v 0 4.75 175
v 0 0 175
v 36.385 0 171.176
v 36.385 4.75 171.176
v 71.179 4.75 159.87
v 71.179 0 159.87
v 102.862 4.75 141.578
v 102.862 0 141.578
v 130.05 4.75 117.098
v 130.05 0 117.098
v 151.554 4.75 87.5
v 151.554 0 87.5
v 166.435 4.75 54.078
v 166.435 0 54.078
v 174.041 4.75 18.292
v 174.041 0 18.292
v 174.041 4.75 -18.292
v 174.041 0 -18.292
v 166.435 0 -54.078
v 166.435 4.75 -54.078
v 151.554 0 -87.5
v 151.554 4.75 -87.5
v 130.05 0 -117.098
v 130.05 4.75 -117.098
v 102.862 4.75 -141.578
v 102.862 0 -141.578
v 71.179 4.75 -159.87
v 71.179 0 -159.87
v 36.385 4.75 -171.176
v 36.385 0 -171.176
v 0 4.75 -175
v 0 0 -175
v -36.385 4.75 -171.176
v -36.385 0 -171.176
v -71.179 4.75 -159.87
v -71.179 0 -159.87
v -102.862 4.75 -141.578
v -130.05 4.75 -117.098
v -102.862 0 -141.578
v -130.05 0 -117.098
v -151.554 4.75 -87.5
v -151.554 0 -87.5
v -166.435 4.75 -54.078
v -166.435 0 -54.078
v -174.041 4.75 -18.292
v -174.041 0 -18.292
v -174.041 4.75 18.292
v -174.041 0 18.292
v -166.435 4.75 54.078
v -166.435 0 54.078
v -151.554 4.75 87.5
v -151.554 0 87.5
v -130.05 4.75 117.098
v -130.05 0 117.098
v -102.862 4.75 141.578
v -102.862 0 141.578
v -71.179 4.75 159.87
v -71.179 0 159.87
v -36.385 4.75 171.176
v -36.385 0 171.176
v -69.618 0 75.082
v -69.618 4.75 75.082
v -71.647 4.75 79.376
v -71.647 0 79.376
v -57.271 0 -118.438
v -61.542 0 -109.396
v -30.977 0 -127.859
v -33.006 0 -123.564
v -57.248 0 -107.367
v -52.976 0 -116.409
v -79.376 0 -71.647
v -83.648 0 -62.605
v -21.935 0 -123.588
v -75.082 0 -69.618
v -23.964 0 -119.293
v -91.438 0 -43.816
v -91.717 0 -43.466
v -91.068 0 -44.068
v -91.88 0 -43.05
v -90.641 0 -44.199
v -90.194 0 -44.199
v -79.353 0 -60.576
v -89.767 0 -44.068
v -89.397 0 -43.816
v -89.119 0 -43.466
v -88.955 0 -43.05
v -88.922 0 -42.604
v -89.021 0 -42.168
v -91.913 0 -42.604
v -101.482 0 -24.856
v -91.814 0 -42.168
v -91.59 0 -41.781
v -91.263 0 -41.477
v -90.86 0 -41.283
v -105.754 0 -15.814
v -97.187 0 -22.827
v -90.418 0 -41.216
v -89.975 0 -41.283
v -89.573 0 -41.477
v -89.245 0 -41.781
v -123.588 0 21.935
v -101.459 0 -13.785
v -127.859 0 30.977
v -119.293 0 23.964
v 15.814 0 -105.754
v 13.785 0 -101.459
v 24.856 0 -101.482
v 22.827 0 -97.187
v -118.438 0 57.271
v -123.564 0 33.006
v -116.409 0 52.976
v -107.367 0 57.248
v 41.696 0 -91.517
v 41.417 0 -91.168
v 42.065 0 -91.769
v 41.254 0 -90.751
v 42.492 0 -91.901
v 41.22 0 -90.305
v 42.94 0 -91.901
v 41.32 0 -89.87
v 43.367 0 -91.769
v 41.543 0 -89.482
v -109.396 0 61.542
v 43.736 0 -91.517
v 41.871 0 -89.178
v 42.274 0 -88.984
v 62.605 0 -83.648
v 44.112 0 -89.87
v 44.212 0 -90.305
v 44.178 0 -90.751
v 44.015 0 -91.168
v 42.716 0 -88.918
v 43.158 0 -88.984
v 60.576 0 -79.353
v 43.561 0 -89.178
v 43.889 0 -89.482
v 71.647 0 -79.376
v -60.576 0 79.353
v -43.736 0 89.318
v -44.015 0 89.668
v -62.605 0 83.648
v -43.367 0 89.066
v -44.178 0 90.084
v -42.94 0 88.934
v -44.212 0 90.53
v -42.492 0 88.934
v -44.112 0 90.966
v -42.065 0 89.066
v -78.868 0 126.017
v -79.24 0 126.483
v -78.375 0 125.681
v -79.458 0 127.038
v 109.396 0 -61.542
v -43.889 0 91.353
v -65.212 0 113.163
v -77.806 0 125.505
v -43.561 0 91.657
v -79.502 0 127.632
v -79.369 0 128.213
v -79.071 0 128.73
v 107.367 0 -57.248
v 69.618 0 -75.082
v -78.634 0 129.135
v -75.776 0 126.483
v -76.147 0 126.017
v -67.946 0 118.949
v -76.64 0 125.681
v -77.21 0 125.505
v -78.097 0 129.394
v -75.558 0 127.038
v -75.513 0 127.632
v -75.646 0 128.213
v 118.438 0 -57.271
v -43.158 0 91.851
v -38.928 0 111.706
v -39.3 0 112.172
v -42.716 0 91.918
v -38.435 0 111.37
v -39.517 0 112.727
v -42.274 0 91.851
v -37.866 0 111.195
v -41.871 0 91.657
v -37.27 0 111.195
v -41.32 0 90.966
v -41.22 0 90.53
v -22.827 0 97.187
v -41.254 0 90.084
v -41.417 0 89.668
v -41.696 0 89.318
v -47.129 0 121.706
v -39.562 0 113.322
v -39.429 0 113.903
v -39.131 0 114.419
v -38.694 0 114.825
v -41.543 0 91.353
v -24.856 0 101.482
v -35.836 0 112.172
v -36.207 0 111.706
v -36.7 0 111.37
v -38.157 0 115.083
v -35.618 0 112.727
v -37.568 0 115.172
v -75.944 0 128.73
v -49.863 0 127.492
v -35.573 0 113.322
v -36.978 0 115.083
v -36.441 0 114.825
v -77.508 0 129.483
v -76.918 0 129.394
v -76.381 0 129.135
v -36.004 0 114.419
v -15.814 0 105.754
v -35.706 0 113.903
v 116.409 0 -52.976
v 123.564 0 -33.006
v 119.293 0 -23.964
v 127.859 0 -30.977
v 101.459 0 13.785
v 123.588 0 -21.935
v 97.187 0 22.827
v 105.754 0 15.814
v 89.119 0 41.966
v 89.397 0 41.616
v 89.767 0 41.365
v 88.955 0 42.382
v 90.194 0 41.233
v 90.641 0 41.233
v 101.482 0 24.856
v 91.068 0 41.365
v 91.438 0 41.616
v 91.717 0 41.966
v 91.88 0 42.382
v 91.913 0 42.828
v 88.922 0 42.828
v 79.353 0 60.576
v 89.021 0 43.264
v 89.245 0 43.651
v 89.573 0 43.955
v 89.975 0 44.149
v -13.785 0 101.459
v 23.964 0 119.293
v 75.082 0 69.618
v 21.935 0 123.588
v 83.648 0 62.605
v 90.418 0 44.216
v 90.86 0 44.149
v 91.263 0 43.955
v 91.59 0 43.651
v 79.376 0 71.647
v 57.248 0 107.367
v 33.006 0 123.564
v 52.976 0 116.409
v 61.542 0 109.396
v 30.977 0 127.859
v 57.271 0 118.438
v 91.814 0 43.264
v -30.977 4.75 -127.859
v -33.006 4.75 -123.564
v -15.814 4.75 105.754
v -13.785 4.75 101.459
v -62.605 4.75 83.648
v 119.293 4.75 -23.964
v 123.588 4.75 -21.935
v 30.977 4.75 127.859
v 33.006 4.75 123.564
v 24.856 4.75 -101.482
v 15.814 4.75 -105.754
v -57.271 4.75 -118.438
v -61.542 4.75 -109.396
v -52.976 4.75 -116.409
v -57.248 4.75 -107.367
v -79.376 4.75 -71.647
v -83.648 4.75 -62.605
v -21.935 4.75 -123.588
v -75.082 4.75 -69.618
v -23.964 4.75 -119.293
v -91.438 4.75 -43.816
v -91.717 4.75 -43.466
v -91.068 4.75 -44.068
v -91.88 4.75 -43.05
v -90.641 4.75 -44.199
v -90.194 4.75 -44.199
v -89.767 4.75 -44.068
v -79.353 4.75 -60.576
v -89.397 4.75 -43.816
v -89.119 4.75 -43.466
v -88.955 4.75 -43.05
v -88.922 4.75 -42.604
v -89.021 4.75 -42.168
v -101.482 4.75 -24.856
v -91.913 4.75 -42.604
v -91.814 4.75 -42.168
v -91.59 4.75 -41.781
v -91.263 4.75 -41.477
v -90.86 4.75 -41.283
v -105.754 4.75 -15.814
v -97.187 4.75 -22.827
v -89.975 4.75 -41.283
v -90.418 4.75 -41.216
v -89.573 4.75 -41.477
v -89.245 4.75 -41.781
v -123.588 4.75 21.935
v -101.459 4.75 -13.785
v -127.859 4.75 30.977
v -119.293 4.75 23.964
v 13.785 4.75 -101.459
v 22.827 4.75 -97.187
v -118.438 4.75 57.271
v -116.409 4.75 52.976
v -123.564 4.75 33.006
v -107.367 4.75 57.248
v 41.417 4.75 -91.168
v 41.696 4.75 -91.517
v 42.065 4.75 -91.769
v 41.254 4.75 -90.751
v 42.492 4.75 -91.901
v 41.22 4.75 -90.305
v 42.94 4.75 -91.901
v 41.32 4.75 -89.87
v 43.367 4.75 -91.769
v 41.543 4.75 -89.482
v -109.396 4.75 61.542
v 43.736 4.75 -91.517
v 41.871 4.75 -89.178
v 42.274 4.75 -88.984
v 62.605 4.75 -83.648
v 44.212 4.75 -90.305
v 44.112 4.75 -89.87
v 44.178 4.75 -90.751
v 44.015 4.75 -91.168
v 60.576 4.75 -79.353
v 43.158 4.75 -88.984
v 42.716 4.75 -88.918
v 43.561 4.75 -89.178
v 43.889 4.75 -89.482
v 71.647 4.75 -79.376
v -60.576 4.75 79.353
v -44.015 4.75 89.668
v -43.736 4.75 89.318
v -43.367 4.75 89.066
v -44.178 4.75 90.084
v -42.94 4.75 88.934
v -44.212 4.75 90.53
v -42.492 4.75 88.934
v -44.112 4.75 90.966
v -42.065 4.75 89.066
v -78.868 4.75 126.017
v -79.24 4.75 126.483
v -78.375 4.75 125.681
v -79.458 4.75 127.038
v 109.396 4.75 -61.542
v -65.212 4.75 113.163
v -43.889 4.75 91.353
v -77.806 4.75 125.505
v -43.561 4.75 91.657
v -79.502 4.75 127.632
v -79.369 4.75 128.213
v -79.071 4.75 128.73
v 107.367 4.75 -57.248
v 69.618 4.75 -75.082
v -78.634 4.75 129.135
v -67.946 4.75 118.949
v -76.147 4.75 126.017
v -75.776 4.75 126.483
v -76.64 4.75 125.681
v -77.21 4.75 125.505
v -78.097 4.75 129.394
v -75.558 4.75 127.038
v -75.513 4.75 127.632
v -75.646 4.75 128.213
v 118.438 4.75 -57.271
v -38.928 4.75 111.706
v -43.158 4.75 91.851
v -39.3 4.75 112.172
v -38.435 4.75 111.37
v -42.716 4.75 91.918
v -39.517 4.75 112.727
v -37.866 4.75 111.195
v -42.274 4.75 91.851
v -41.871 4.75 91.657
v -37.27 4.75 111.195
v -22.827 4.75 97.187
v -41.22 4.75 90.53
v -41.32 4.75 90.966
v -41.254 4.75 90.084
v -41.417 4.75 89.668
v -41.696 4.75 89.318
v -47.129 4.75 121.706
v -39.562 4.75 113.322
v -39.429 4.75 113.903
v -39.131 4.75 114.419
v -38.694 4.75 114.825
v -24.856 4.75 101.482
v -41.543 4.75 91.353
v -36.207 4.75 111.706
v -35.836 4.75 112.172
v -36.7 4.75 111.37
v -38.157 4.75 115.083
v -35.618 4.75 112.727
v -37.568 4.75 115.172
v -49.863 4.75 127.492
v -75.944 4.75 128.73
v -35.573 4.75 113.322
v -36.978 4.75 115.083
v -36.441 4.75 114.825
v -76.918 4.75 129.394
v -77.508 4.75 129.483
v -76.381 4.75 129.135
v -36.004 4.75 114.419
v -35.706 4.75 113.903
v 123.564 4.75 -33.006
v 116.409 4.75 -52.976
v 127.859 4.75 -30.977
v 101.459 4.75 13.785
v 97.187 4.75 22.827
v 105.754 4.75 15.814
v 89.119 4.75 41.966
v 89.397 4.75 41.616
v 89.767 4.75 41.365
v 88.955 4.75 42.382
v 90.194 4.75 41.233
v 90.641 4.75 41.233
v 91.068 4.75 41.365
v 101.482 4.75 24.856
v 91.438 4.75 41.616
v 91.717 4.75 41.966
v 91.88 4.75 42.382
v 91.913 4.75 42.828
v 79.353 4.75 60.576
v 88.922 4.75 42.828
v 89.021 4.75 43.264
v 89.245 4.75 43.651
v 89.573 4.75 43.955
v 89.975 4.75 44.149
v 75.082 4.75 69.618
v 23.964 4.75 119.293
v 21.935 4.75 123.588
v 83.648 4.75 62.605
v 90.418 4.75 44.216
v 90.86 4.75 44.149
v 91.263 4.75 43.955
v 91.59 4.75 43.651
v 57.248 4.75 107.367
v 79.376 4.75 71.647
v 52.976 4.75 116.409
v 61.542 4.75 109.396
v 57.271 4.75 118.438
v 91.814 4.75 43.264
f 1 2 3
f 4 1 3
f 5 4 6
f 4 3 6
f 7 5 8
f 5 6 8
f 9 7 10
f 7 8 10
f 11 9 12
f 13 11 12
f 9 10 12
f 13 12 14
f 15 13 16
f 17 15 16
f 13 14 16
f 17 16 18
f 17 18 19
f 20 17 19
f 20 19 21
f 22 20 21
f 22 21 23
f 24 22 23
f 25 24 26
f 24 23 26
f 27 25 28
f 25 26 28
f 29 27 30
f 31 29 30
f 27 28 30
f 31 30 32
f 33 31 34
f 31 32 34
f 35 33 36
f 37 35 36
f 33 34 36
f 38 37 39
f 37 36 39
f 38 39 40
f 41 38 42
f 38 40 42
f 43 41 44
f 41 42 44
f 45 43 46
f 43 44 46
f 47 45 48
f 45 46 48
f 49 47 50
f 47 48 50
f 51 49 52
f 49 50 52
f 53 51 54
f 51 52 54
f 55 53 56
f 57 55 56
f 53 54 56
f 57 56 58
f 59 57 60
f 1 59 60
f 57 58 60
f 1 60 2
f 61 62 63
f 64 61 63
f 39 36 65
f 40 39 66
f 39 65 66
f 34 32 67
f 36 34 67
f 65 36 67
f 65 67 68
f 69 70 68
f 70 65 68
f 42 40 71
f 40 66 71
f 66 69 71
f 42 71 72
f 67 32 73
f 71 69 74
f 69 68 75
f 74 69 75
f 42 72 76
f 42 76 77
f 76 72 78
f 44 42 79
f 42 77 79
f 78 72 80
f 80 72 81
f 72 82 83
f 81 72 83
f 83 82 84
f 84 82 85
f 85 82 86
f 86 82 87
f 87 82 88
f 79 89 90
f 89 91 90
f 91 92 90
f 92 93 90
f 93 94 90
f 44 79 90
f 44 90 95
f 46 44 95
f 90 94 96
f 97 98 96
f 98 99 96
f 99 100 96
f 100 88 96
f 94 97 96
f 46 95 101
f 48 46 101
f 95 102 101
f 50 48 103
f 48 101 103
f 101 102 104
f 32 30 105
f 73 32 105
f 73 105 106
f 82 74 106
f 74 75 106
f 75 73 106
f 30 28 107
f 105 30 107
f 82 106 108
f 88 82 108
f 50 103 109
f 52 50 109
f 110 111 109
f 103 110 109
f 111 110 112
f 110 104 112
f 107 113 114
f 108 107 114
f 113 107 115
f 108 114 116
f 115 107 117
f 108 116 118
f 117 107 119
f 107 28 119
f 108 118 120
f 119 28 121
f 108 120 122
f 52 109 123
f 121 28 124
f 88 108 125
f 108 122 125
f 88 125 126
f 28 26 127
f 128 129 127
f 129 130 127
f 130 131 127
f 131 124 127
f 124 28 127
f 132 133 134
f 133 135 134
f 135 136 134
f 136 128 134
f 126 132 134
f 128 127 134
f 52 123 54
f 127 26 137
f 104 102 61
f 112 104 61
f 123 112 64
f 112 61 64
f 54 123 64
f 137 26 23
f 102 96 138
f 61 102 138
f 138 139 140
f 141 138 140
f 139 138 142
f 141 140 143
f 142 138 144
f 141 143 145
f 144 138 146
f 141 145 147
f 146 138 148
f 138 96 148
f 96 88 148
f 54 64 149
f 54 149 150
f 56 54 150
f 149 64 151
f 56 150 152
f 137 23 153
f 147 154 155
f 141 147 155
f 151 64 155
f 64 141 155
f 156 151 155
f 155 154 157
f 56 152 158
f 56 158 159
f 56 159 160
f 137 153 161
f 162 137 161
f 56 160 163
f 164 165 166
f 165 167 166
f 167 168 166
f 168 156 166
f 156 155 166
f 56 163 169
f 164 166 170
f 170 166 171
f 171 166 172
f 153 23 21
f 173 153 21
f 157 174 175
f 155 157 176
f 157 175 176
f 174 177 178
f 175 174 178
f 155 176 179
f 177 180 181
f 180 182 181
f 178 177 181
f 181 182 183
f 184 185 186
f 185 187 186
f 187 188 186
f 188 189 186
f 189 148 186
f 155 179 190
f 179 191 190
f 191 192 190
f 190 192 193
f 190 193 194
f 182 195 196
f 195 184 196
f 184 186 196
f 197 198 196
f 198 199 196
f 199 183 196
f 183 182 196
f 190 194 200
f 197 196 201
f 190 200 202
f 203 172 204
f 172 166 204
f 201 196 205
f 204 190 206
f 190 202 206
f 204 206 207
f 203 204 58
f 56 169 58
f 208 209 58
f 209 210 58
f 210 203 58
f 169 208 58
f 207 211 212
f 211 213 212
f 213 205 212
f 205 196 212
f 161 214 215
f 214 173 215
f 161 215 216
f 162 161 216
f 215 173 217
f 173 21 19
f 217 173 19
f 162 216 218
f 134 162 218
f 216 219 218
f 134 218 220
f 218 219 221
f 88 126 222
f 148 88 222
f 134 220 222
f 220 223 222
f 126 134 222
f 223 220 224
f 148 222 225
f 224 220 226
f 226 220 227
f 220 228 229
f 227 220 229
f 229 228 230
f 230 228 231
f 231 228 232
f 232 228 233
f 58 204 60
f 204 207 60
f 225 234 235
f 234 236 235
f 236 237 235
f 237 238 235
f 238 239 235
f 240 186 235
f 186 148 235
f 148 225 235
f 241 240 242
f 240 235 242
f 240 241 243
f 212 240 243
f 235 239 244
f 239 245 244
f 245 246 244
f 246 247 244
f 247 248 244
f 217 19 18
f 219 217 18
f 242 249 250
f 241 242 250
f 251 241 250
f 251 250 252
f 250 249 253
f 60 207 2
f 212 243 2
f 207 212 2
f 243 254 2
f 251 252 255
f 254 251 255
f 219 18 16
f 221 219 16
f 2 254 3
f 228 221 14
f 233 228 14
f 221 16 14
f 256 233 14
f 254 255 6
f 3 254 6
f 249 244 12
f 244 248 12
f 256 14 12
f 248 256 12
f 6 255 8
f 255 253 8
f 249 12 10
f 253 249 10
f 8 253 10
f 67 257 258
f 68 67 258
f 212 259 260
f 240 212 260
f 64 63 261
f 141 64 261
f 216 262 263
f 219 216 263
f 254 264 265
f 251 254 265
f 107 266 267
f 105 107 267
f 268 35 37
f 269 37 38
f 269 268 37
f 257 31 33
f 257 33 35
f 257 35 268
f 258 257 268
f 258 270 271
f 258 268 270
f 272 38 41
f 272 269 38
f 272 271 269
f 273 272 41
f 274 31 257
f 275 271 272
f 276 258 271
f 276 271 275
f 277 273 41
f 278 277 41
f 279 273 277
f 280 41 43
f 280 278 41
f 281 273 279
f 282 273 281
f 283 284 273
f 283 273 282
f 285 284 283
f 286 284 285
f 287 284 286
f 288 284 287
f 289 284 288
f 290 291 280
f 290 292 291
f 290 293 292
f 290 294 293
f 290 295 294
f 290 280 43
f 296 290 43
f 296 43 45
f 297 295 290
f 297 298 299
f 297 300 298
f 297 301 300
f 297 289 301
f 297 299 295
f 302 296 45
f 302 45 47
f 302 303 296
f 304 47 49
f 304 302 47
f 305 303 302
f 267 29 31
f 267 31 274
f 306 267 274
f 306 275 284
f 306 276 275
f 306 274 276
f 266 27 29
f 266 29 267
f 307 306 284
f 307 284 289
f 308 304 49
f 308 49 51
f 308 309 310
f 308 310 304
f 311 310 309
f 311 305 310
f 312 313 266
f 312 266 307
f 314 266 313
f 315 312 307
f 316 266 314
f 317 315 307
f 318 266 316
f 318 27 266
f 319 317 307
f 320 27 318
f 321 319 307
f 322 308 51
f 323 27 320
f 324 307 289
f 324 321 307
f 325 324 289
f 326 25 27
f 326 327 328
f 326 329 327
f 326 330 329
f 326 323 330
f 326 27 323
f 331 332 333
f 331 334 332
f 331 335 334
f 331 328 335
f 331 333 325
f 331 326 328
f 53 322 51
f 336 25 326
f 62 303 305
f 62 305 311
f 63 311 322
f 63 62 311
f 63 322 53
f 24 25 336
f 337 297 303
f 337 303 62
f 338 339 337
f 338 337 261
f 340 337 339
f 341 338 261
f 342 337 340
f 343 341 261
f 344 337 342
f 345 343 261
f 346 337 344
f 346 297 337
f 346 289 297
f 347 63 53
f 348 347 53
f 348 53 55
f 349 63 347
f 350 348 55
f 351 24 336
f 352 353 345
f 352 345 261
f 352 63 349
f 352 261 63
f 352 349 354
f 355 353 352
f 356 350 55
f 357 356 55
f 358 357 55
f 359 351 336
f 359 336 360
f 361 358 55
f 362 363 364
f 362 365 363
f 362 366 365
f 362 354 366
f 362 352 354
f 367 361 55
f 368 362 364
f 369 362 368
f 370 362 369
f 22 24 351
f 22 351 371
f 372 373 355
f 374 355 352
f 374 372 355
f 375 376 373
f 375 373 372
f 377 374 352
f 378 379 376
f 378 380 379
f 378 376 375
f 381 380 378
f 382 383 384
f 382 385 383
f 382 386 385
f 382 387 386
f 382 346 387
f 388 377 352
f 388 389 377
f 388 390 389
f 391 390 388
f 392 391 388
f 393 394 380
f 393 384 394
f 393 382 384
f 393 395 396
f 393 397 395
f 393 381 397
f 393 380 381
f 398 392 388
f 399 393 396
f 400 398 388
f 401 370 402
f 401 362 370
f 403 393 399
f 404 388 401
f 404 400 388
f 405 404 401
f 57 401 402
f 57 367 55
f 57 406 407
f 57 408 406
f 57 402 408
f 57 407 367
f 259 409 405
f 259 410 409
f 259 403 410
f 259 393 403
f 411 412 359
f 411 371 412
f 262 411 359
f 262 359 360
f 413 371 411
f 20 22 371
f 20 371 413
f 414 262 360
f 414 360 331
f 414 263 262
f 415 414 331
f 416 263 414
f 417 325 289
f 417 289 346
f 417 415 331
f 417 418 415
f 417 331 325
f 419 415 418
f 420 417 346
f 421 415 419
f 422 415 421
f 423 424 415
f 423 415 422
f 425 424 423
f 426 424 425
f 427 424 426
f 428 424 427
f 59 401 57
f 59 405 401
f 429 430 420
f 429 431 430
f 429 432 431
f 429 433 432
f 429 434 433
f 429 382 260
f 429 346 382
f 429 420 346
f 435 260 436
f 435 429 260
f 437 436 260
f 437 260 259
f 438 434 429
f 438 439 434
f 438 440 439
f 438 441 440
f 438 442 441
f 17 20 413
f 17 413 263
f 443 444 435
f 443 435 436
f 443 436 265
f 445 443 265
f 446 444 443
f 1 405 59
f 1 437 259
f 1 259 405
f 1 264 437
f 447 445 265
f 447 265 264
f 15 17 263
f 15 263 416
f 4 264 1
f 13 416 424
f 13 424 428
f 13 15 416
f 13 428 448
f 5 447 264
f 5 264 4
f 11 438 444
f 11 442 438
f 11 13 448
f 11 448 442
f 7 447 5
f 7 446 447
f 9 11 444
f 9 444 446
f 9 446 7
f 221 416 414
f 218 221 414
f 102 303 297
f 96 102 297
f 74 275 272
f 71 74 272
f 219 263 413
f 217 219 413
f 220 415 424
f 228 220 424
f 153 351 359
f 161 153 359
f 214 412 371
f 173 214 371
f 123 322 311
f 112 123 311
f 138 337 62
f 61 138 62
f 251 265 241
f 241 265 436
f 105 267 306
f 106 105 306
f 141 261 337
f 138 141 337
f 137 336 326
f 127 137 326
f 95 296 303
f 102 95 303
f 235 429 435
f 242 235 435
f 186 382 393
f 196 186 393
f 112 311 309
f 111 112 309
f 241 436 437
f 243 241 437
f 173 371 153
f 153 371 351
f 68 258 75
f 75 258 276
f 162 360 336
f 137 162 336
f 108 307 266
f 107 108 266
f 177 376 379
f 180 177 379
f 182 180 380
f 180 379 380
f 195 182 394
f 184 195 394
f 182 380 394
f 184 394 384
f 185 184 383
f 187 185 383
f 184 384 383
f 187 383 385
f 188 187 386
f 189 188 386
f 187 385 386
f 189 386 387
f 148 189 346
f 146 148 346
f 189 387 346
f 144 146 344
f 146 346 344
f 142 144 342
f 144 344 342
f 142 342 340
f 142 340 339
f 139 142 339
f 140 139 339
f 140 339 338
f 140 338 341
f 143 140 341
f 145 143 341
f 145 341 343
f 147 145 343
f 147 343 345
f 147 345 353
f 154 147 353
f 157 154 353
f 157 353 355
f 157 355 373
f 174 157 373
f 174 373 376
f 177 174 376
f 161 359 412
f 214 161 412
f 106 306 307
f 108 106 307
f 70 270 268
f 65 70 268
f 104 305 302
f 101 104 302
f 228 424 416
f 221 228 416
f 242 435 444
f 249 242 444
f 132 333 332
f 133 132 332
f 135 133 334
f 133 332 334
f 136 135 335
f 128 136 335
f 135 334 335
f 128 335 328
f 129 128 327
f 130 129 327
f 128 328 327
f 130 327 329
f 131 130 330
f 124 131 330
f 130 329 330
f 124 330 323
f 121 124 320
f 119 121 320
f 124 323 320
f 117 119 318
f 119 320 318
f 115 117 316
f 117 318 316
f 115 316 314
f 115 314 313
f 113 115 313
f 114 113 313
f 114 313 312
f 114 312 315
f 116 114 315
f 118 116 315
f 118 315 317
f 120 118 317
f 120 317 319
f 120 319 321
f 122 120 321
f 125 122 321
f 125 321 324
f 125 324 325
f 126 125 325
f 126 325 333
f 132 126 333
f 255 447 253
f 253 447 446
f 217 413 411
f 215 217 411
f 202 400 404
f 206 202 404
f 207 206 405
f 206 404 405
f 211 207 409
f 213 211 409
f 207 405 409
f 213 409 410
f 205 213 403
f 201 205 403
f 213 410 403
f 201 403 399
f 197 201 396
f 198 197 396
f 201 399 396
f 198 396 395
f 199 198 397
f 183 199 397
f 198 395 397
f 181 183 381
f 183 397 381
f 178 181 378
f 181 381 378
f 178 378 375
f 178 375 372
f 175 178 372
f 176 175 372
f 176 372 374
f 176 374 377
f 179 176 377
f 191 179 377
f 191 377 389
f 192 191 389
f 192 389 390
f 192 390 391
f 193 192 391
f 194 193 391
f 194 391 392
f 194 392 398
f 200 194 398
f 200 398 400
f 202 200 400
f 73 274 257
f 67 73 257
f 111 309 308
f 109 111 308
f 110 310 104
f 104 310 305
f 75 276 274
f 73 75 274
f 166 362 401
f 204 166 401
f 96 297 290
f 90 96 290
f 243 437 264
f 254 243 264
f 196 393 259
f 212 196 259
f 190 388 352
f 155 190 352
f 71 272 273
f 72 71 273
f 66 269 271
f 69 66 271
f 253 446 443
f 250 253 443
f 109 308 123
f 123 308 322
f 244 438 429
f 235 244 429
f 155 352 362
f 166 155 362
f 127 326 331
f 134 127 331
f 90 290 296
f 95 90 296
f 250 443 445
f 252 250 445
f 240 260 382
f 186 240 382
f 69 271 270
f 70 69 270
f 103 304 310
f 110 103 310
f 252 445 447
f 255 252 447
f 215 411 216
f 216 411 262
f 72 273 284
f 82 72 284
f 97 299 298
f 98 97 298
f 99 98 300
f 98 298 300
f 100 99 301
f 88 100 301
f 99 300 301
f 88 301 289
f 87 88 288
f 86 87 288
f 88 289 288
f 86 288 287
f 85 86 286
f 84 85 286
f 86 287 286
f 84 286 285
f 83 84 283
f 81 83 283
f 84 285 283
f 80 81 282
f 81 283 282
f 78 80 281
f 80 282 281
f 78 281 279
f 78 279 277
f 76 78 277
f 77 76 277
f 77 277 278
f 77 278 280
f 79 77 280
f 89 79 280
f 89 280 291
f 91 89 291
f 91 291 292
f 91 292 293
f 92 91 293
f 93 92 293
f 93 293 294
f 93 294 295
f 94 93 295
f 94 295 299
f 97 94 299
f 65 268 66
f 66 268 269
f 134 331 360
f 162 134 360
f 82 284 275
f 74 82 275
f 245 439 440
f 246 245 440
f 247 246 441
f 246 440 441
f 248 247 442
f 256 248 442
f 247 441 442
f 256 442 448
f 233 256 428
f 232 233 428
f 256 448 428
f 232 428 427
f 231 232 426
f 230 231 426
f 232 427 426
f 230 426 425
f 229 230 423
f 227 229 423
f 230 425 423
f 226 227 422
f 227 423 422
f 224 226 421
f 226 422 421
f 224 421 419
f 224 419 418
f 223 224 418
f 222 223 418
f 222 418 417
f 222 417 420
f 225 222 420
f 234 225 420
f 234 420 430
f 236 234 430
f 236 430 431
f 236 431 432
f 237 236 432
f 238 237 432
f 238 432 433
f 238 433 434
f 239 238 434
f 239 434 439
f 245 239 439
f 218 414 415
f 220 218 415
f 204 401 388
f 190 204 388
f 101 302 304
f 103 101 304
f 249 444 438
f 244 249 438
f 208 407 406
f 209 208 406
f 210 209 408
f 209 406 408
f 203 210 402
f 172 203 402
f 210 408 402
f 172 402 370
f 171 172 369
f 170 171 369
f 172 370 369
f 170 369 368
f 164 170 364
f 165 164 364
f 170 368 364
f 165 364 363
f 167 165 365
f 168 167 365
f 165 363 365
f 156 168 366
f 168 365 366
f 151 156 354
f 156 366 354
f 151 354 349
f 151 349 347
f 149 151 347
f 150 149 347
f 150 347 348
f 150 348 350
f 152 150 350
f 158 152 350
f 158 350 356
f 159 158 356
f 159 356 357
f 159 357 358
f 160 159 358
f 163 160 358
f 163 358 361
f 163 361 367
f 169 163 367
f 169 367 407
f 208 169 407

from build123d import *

# Parameters (mm, degrees)
SKETCH1_R           = 175
BOSS_EXTRUDE1_DEPTH = 4.75
CUT_EXTRUDE1_DEPTH  = 4.75
SKETCH4_R           = 2
CUT_EXTRUDE2_DEPTH  = 248.532952352
SKETCH5_R           = 1.5
CUT_EXTRUDE3_DEPTH  = 248.532952352


with BuildPart() as part:
    # Sketch1 → Boss-Extrude1 (new body)
    with BuildSketch(Plane(origin=(0, 0, 0), x_dir=(1, 0, 0), z_dir=(0, 1, 0))):
        with Locations(Location((0, 0, 0), (0, 0, 270))):
            Circle(SKETCH1_R)
    extrude(amount=BOSS_EXTRUDE1_DEPTH)

    # Sketch2 → Cut-Extrude1 (cut)
    with BuildSketch(Plane(origin=(0, 4.75, 0), x_dir=(1, 0, 0), z_dir=(0, 1, 0))):
        Polygon((33.00597779, -123.564301803), (23.964219805, -119.29269642), (21.935207248, -123.587531462), (30.976965232, -127.859136846), align=None)
        Polygon((-13.785119779, -101.458743944), (-22.826877764, -97.18713856), (-24.855890321, -101.481973603), (-15.814132337, -105.753578986), align=None)
        Polygon((-107.367314918, -57.247628225), (-116.409072902, -52.976022841), (-118.438085459, -57.270857884), (-109.396327475, -61.542463267), align=None)
        Polygon((-101.458743944, 13.785119779), (-97.18713856, 22.826877764), (-101.481973603, 24.855890321), (-105.753578986, 15.814132337), align=None)
        Polygon((-123.564301803, -33.00597779), (-119.29269642, -23.964219805), (-123.587531462, -21.935207248), (-127.859136846, -30.976965232), align=None)
        Polygon((107.367314918, 57.247628225), (116.409072902, 52.976022841), (118.438085459, 57.270857884), (109.396327475, 61.542463267), align=None)
        Polygon((-57.247628225, 107.367314918), (-52.976022841, 116.409072902), (-57.270857884, 118.438085459), (-61.542463267, 109.396327475), align=None)
        Polygon((60.576217349, 79.353186084), (69.617975333, 75.081580701), (71.64698789, 79.376415743), (62.605229906, 83.648021127), align=None)
        Polygon((13.785119779, 101.458743944), (22.826877764, 97.18713856), (24.855890321, 101.481973603), (15.814132337, 105.753578986), align=None)
        Polygon((-33.00597779, 123.564301803), (-23.964219805, 119.29269642), (-21.935207248, 123.587531462), (-30.976965232, 127.859136846), align=None)
        Polygon((-79.353186084, 60.576217349), (-75.081580701, 69.617975333), (-79.376415743, 71.64698789), (-83.648021127, 62.605229906), align=None)
        Polygon((-60.576217349, -79.353186084), (-69.617975333, -75.081580701), (-71.64698789, -79.376415743), (-62.605229906, -83.648021127), align=None)
        Polygon((123.564301803, 33.00597779), (119.29269642, 23.964219805), (123.587531462, 21.935207248), (127.859136846, 30.976965232), align=None)
        Polygon((101.458743944, -13.785119779), (97.18713856, -22.826877764), (101.481973603, -24.855890321), (105.753578986, -15.814132337), align=None)
        Polygon((79.353186084, -60.576217349), (75.081580701, -69.617975333), (79.376415743, -71.64698789), (83.648021127, -62.605229906), align=None)
        Polygon((57.247628225, -107.367314918), (52.976022841, -116.409072902), (57.270857884, -118.438085459), (61.542463267, -109.396327475), align=None)
    extrude(amount=-CUT_EXTRUDE1_DEPTH, mode=Mode.SUBTRACT)

    # Sketch4 → Cut-Extrude2 (cut, through all)
    with BuildSketch(Plane(origin=(0, 4.75, 0), x_dir=(1, 0, 0), z_dir=(0, 1, 0))):
        with Locations(Location((-77.507691728, -127.482700681, 0), (0, 0, 270))):
            Circle(SKETCH4_R)
        with Locations(Location((-37.567601624, -113.172242879, 0), (0, 0, 270))):
            Circle(SKETCH4_R)
        Polygon((-47.128974969, -121.705714608), (-65.212490938, -113.162503842), (-67.946318383, -118.949228952), (-49.862802415, -127.492439718), align=None)
    extrude(amount=-CUT_EXTRUDE2_DEPTH, mode=Mode.SUBTRACT)

    # Sketch5 → Cut-Extrude3 (cut, through all)
    with BuildSketch(Plane(origin=(0, 4.75, 0), x_dir=(1, 0, 0), z_dir=(0, 1, 0))):
        with Locations(Location((42.716053835, 90.417579844, 0), (0, 0, 270))):
            Circle(SKETCH5_R)
        with Locations(Location((90.417579844, -42.716053835, 0), (0, 0, 270))):
            Circle(SKETCH5_R)
        with Locations(Location((-42.716053835, -90.417579844, 0), (0, 0, 270))):
            Circle(SKETCH5_R)
        with Locations(Location((-90.417579844, 42.716053835, 0), (0, 0, 270))):
            Circle(SKETCH5_R)
    extrude(amount=-CUT_EXTRUDE3_DEPTH, mode=Mode.SUBTRACT)


solid = part.part
